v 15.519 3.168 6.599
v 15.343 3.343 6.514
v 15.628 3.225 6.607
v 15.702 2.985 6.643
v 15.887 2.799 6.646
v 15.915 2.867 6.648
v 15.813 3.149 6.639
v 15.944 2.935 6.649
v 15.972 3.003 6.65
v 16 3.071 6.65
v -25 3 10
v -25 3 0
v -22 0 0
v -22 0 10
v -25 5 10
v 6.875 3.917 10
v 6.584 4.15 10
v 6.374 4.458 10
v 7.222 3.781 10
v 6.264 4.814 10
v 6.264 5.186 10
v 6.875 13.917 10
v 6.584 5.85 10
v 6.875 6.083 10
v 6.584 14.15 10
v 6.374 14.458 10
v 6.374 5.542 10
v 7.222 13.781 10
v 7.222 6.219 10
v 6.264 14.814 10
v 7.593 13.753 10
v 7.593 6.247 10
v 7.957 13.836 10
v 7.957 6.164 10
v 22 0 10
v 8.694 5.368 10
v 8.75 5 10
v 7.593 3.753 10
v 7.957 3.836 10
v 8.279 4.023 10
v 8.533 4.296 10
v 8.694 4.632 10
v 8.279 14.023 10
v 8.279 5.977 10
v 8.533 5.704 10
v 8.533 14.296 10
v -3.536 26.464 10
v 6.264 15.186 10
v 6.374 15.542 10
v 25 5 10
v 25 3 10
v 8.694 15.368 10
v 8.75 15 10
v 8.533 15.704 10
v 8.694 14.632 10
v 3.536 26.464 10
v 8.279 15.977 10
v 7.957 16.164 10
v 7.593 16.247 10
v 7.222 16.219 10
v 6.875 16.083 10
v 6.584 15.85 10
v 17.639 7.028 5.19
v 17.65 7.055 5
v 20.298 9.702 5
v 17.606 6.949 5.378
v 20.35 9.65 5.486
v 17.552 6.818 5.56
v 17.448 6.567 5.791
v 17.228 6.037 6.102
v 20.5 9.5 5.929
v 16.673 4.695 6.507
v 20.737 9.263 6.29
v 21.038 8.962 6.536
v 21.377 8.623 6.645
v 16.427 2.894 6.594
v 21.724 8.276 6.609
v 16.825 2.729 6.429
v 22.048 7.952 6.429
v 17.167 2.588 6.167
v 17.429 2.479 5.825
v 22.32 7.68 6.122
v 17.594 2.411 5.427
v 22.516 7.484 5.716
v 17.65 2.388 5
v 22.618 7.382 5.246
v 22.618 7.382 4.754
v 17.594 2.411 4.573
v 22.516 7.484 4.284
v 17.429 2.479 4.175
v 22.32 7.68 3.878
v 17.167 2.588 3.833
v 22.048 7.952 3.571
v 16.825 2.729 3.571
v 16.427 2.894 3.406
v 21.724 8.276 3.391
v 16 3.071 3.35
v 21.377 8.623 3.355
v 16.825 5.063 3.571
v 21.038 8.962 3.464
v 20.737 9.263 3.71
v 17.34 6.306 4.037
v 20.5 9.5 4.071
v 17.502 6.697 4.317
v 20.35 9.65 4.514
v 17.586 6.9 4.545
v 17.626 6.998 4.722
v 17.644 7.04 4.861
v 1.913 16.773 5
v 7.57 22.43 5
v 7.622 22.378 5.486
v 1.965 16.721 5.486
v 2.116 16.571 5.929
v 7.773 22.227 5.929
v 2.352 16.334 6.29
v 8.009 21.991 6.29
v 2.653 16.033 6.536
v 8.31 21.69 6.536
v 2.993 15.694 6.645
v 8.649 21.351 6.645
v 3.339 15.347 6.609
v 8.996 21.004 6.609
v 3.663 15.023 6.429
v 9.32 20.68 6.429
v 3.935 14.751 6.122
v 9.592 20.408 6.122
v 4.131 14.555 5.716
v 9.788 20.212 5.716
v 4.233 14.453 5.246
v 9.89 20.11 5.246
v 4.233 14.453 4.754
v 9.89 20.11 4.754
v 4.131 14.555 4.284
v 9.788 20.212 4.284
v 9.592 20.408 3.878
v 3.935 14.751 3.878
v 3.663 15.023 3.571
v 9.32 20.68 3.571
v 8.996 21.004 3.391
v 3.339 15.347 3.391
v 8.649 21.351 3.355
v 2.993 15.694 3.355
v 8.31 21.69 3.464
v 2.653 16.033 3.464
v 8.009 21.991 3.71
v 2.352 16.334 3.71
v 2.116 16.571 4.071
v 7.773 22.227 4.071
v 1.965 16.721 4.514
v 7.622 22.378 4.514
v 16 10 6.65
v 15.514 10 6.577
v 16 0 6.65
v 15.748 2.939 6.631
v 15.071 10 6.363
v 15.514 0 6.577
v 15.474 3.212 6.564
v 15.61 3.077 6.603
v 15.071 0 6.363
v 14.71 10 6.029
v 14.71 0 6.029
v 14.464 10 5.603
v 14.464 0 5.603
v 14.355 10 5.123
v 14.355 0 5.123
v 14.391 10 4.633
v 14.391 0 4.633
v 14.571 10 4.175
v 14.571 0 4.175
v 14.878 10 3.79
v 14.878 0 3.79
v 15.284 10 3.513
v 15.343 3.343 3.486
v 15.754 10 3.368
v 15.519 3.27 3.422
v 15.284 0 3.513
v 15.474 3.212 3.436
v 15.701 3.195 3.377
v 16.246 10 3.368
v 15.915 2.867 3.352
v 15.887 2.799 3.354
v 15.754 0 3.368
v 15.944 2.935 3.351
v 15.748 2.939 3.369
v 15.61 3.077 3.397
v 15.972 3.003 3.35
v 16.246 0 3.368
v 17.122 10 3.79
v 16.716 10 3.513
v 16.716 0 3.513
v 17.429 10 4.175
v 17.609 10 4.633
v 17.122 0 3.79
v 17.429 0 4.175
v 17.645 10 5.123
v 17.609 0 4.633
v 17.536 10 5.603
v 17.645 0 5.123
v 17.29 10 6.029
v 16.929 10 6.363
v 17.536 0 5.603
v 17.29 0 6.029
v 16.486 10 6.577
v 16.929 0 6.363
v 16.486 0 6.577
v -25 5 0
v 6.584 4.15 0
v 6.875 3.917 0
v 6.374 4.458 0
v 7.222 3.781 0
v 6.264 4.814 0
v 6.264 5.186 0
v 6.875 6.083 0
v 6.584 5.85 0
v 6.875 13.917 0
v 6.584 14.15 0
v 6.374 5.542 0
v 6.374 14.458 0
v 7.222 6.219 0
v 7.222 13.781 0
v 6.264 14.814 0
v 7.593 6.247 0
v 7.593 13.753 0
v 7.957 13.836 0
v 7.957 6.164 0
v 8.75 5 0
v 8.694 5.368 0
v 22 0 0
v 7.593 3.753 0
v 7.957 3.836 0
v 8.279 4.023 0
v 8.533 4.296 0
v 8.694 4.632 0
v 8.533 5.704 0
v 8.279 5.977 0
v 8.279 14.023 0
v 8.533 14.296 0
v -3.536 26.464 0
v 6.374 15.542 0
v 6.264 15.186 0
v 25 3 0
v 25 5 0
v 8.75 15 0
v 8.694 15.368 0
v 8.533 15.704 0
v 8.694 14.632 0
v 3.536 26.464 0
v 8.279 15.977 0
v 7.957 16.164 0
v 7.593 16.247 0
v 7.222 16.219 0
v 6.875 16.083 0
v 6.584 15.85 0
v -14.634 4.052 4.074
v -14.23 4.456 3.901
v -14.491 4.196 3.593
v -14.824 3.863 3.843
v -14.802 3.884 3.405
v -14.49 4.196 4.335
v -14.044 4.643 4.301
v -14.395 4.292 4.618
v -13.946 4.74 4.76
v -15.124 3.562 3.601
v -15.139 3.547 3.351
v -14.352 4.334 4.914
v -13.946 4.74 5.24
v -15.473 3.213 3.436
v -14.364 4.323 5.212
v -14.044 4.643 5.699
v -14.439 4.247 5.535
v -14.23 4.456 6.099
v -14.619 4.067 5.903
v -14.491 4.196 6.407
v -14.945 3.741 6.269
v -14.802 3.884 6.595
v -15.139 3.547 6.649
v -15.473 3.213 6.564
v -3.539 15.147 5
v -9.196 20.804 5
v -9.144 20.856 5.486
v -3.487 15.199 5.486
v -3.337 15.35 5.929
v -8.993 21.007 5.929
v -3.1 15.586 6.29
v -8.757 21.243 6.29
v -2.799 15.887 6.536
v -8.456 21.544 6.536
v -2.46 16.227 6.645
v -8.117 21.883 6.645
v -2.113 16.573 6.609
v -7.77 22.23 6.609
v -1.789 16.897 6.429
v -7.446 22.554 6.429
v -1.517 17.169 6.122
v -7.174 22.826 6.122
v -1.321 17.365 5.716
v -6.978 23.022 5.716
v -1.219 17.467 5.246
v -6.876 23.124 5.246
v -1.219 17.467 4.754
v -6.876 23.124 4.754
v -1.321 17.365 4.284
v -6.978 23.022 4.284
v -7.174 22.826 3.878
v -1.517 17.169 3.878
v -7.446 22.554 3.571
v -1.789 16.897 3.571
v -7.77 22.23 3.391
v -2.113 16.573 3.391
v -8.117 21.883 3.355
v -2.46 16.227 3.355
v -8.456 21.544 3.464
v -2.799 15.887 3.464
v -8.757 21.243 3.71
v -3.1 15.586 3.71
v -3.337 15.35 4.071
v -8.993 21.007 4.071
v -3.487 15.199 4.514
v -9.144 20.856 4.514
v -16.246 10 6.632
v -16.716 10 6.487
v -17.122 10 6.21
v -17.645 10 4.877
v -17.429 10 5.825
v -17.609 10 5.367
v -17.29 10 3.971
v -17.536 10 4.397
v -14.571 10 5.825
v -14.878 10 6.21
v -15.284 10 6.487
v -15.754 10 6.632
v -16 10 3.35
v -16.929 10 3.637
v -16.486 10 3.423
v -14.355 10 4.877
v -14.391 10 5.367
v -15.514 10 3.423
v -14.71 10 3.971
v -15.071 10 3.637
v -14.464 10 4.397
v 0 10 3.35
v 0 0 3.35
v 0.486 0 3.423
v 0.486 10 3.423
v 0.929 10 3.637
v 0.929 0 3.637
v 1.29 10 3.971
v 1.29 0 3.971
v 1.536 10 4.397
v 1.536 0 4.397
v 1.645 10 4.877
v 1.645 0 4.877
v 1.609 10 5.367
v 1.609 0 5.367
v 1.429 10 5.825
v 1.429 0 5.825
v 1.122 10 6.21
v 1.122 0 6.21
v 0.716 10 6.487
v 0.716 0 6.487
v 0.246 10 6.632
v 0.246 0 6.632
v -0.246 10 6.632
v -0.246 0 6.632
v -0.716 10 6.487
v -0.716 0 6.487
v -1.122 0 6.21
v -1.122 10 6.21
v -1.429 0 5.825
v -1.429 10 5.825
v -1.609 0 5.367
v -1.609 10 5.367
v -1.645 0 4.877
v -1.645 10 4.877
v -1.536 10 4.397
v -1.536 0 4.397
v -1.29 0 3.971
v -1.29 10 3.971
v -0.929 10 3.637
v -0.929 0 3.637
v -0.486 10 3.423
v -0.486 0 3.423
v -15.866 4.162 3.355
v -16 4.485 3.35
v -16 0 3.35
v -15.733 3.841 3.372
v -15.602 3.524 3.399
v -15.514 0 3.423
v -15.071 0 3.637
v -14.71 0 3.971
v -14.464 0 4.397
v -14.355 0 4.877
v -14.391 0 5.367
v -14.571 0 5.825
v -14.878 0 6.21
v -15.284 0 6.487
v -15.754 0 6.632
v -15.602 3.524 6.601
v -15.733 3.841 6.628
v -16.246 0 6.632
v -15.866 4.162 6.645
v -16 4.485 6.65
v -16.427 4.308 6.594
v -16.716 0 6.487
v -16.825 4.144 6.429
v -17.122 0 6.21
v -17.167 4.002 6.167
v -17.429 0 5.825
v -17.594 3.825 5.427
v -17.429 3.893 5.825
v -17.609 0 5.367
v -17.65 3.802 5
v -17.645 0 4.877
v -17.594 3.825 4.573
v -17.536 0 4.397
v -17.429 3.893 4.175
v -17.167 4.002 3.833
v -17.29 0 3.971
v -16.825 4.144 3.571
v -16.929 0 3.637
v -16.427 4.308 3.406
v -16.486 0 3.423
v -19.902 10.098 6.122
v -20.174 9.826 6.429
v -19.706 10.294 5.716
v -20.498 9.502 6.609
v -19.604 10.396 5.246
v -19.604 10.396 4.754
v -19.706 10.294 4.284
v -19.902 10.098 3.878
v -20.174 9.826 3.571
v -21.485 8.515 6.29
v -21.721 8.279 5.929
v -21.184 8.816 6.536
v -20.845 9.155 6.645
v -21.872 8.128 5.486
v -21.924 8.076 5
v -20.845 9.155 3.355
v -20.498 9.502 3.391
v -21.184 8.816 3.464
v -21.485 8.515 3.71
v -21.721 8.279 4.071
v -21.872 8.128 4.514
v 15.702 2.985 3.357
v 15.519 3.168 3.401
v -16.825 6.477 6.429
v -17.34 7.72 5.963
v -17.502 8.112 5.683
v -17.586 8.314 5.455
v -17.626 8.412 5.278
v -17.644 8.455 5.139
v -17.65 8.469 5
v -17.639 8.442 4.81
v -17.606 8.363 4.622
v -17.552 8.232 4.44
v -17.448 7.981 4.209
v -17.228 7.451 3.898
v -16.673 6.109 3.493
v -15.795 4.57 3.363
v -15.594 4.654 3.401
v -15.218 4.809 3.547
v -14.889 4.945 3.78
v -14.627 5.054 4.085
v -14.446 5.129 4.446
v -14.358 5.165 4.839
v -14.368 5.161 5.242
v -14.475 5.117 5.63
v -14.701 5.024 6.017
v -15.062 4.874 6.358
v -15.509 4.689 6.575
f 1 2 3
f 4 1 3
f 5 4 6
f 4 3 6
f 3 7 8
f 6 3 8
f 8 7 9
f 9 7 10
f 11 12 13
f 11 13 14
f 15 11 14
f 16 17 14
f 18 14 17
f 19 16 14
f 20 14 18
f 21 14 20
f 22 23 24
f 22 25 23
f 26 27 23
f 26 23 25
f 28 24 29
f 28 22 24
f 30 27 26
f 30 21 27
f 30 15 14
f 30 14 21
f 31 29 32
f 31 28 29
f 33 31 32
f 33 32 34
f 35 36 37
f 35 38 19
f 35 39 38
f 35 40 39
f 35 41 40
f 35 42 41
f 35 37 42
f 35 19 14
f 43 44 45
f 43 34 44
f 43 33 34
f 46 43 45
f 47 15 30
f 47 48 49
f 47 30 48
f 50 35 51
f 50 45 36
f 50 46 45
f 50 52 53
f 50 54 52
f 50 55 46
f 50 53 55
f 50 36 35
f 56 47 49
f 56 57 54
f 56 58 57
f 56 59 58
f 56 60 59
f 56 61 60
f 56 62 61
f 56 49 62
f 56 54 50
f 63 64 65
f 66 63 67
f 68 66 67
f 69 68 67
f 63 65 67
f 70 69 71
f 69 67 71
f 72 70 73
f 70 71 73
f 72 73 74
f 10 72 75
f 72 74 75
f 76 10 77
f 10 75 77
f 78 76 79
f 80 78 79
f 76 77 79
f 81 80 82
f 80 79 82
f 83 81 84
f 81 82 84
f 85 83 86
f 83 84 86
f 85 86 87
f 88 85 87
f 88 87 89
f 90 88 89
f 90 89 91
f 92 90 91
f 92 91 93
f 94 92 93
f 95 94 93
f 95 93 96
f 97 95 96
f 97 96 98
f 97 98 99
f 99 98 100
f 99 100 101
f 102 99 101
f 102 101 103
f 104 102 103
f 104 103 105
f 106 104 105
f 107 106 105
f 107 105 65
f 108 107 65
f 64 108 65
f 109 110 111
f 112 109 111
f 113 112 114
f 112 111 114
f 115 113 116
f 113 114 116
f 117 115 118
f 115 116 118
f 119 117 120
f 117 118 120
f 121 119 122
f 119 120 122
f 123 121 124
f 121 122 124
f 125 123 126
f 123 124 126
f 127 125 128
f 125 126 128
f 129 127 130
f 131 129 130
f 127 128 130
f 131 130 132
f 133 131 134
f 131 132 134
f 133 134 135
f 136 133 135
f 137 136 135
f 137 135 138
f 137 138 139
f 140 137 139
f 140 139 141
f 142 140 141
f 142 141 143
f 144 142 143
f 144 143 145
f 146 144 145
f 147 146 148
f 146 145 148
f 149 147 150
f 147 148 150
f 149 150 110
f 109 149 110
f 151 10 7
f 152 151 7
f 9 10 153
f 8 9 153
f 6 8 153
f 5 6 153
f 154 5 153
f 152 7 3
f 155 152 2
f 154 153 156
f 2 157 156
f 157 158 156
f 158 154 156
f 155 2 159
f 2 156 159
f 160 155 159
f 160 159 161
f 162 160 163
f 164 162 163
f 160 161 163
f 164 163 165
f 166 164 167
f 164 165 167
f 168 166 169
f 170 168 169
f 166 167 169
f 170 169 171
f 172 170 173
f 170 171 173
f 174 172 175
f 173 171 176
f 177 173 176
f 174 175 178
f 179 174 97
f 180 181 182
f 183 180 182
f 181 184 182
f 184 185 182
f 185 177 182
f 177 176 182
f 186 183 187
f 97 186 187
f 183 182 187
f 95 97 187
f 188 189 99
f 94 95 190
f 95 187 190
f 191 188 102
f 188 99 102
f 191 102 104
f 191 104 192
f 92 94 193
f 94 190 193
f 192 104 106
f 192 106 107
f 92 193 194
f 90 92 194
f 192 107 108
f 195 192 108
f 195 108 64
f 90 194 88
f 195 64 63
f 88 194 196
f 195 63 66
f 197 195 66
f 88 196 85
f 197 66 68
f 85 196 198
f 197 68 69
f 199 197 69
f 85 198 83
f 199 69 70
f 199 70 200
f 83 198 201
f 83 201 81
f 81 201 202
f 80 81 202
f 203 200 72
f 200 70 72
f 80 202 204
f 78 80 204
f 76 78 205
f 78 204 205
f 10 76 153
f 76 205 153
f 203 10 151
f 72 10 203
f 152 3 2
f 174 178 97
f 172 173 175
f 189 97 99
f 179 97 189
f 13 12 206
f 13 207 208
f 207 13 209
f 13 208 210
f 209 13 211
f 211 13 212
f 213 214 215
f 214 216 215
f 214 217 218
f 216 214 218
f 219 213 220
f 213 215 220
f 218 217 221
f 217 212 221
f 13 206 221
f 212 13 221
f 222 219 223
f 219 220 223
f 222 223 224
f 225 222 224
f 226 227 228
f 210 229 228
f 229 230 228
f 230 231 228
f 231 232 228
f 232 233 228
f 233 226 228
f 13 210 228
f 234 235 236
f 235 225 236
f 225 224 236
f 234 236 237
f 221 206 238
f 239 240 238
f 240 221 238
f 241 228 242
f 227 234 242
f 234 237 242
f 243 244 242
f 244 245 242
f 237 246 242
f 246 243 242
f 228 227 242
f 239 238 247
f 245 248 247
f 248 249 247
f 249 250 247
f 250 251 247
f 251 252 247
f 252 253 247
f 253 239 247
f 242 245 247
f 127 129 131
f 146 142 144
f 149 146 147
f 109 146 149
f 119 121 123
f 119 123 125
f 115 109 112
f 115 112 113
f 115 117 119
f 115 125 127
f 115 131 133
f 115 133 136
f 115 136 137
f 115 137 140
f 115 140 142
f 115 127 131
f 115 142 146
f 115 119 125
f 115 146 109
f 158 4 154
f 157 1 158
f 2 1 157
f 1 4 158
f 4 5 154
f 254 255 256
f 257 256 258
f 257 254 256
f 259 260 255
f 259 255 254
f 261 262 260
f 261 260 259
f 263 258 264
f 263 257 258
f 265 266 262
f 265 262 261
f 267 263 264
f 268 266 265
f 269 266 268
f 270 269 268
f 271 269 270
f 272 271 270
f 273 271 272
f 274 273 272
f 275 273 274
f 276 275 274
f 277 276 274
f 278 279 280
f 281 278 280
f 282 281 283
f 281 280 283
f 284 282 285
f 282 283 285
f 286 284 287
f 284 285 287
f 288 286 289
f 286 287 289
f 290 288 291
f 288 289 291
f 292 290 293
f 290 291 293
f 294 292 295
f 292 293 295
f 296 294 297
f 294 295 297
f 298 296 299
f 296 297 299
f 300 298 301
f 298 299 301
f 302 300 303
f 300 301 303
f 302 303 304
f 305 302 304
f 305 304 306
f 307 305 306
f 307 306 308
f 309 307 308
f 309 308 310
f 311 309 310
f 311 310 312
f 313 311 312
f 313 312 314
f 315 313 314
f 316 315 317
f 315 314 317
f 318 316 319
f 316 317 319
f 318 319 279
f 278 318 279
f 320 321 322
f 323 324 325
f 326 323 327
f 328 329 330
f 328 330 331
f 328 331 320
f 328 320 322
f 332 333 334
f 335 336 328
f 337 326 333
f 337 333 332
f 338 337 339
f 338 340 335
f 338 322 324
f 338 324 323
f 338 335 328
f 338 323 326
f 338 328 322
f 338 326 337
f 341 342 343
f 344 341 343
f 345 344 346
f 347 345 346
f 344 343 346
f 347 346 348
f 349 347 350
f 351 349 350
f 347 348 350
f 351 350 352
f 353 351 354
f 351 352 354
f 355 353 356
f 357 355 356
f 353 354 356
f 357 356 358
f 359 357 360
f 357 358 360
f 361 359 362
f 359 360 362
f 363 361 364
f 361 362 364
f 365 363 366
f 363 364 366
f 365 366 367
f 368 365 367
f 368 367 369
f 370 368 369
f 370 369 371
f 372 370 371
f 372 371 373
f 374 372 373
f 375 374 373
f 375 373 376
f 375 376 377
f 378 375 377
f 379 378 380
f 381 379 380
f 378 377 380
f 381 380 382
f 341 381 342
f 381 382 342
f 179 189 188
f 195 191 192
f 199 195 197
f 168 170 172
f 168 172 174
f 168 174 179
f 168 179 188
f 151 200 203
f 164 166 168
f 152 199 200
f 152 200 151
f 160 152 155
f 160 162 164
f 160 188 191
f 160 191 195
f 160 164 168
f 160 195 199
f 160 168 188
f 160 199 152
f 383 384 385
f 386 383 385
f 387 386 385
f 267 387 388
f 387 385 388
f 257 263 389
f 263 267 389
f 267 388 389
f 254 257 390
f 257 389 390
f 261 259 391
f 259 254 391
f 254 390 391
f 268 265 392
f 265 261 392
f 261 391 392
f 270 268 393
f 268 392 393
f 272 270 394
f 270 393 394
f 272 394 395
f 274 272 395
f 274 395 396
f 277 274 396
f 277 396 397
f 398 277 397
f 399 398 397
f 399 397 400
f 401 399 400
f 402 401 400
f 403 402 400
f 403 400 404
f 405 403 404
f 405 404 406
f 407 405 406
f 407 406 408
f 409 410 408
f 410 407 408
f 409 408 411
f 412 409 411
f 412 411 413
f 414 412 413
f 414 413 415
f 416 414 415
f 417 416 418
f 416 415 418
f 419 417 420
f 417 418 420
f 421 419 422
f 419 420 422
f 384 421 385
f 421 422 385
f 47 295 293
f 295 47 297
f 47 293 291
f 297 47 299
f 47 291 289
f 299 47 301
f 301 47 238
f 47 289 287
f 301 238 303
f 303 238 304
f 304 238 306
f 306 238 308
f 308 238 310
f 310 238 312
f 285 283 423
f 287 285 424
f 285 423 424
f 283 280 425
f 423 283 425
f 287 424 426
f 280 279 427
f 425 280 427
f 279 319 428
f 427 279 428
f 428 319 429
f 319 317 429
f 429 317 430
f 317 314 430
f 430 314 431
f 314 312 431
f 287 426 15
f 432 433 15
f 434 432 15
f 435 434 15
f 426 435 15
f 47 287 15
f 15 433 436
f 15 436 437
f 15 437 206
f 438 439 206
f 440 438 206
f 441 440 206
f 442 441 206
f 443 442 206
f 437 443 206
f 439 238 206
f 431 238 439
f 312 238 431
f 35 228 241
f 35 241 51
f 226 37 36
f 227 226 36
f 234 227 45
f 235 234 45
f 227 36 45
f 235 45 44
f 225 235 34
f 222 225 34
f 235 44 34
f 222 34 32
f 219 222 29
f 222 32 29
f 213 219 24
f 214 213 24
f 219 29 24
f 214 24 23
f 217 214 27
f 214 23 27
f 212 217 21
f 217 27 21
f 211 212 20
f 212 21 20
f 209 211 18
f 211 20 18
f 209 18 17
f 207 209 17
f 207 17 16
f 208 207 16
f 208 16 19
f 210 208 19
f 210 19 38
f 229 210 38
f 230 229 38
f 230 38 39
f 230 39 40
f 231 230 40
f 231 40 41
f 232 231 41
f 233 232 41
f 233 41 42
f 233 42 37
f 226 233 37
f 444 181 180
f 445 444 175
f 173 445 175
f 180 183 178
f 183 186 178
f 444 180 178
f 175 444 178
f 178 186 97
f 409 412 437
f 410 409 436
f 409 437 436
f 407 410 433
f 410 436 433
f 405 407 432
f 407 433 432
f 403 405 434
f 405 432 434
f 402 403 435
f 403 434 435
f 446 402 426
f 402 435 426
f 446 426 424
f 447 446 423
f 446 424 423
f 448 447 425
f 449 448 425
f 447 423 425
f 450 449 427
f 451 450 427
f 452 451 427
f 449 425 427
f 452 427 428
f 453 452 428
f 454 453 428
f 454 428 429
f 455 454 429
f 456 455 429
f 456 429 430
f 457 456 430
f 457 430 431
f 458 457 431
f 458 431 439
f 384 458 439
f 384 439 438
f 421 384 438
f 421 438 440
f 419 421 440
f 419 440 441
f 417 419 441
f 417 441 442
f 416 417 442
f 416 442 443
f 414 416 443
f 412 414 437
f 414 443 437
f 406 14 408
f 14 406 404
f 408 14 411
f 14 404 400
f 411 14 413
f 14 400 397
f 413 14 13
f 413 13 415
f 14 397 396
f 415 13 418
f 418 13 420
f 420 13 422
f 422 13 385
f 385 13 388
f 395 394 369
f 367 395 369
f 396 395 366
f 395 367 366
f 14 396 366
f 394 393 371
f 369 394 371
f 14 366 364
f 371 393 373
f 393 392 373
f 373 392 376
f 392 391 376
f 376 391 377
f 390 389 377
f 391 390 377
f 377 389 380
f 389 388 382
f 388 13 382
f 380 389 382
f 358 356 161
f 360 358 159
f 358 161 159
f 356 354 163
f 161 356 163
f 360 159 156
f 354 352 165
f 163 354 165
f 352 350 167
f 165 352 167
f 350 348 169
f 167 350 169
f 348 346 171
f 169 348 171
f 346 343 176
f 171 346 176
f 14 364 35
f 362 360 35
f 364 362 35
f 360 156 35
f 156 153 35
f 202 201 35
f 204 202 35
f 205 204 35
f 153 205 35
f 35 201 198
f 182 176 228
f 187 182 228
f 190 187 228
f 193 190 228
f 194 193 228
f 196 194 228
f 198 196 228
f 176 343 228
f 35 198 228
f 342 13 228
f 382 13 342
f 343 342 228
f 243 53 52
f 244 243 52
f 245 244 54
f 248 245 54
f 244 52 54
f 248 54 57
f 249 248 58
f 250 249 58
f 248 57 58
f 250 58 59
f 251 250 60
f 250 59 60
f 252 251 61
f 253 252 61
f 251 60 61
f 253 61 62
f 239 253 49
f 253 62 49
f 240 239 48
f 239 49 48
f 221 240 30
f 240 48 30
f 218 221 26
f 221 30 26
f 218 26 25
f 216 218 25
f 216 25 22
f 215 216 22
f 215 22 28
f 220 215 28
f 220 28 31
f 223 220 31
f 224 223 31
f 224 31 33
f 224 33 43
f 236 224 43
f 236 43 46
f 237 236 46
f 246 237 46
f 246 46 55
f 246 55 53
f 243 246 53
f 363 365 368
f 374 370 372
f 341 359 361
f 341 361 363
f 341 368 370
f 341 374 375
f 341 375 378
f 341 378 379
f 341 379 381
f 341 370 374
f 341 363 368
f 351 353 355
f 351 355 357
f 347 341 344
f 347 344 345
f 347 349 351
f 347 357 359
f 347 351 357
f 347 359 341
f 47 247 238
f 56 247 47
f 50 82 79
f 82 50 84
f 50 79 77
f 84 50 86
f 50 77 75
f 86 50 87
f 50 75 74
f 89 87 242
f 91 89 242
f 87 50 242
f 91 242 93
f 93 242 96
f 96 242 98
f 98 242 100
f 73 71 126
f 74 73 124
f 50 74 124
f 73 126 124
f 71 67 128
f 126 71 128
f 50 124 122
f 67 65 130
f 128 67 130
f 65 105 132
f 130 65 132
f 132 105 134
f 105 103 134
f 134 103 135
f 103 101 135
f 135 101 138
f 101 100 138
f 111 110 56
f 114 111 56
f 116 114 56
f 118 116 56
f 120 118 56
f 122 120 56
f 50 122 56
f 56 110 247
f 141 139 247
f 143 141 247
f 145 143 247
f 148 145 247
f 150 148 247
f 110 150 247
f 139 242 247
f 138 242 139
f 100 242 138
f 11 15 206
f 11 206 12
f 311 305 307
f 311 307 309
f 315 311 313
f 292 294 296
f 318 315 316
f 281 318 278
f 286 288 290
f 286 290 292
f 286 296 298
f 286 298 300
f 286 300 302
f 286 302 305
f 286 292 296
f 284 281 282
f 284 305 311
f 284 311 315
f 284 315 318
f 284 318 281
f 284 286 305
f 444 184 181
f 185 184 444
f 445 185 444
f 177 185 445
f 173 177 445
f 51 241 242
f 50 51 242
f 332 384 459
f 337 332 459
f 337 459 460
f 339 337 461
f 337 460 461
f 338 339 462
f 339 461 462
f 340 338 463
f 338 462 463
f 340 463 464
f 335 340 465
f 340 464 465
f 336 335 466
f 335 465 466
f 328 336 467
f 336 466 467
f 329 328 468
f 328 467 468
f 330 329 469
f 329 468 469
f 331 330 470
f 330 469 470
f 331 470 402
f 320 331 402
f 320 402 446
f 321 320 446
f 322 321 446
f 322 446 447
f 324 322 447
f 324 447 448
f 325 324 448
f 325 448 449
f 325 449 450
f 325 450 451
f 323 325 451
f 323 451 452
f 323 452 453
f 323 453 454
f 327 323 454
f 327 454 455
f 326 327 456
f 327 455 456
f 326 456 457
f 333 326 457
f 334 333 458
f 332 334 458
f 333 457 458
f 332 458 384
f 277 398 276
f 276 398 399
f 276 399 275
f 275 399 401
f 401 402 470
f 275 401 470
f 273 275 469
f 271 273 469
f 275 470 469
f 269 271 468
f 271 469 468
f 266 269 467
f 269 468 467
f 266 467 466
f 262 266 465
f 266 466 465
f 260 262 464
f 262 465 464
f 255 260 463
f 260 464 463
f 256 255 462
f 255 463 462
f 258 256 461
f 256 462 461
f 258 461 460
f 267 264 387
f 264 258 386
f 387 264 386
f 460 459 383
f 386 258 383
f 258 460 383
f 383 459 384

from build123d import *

# Parameters (mm, degrees)
BOSS_EXTRU_1_DEPTH      = 10
ESQUISSE2_R             = 1.65
ENL_V_MAT_EXTRU_1_DEPTH = 8
ESQUISSE3_R             = 1.65
ENL_V_MAT_EXTRU_2_DEPTH = 8
CHANFREIN1_SIZE         = 5
ESQUISSE4_R             = 1.65
ENL_V_MAT_EXTRU_3_DEPTH = 10
CHANFREIN3_SIZE         = 3
ESQUISSE5_R             = 1.25
ENL_V_MAT_EXTRU_4_DEPTH = 38.754045686


with BuildPart() as part:
    # Esquisse1 → Boss.-Extru.1 (new body)
    with BuildSketch(Plane.XY):
        Polygon((-25, 0), (25, 0), (25, 5), (0, 30), (-25, 5), align=None)
    extrude(amount=BOSS_EXTRU_1_DEPTH)

    # Esquisse2 → Enlèv. mat.-Extru.1 (cut)
    with BuildSketch(Plane(origin=(15, 15, 0), x_dir=(0, 0, -1), z_dir=(0.7071067811865511, 0.7071067811865439, 0))):
        with Locations(Location((-5, 8.857864376, 0), (0, 0, 90))):
            Circle(ESQUISSE2_R)
        with Locations(Location((-5, -9.142135624, 0), (0, 0, 90))):
            Circle(ESQUISSE2_R)
    extrude(amount=-ENL_V_MAT_EXTRU_1_DEPTH, mode=Mode.SUBTRACT)

    # Esquisse3 → Enlèv. mat.-Extru.2 (cut)
    with BuildSketch(Plane(origin=(-15, 15, 0), x_dir=(0, 0, 1), z_dir=(-0.7071067811865511, 0.7071067811865439, 0))):
        with Locations(Location((5, 9.857864376, 0), (0, 0, 270))):
            Circle(ESQUISSE3_R)
        with Locations(Location((5, -8.142135624, 0), (0, 0, 270))):
            Circle(ESQUISSE3_R)
    extrude(amount=-ENL_V_MAT_EXTRU_2_DEPTH, mode=Mode.SUBTRACT)

    # Chanfrein1
    chanfrein1_edges = [part.edges().sort_by_distance(p)[0] for p in [
        (0, 30, 5),
    ]]
    chamfer(chanfrein1_edges, length=CHANFREIN1_SIZE)

    # Esquisse4 → Enlèv. mat.-Extru.3 (cut)
    with BuildSketch(Plane.XZ):
        with Locations(Location((0, 5, 0), (0, 0, 270))):
            Circle(ESQUISSE4_R)
        with Locations(Location((-16, 5, 0), (0, 0, 270))):
            Circle(ESQUISSE4_R)
        with Locations(Location((16, 5, 0), (0, 0, 90))):
            Circle(ESQUISSE4_R)
    extrude(amount=-ENL_V_MAT_EXTRU_3_DEPTH, mode=Mode.SUBTRACT)

    # Chanfrein3
    chanfrein3_edges = [part.edges().sort_by_distance(p)[0] for p in [
        (25, 0, 5),
        (-25, 0, 5),
    ]]
    chamfer(chanfrein3_edges, length=CHANFREIN3_SIZE)

    # Esquisse5 → Enlèv. mat.-Extru.4 (cut, through all)
    with BuildSketch(Plane.XY.offset(10)):
        with Locations((7.5, 15)):
            Circle(ESQUISSE5_R)
        with Locations((7.5, 5)):
            Circle(ESQUISSE5_R)
    extrude(amount=-ENL_V_MAT_EXTRU_4_DEPTH, mode=Mode.SUBTRACT)


solid = part.part
